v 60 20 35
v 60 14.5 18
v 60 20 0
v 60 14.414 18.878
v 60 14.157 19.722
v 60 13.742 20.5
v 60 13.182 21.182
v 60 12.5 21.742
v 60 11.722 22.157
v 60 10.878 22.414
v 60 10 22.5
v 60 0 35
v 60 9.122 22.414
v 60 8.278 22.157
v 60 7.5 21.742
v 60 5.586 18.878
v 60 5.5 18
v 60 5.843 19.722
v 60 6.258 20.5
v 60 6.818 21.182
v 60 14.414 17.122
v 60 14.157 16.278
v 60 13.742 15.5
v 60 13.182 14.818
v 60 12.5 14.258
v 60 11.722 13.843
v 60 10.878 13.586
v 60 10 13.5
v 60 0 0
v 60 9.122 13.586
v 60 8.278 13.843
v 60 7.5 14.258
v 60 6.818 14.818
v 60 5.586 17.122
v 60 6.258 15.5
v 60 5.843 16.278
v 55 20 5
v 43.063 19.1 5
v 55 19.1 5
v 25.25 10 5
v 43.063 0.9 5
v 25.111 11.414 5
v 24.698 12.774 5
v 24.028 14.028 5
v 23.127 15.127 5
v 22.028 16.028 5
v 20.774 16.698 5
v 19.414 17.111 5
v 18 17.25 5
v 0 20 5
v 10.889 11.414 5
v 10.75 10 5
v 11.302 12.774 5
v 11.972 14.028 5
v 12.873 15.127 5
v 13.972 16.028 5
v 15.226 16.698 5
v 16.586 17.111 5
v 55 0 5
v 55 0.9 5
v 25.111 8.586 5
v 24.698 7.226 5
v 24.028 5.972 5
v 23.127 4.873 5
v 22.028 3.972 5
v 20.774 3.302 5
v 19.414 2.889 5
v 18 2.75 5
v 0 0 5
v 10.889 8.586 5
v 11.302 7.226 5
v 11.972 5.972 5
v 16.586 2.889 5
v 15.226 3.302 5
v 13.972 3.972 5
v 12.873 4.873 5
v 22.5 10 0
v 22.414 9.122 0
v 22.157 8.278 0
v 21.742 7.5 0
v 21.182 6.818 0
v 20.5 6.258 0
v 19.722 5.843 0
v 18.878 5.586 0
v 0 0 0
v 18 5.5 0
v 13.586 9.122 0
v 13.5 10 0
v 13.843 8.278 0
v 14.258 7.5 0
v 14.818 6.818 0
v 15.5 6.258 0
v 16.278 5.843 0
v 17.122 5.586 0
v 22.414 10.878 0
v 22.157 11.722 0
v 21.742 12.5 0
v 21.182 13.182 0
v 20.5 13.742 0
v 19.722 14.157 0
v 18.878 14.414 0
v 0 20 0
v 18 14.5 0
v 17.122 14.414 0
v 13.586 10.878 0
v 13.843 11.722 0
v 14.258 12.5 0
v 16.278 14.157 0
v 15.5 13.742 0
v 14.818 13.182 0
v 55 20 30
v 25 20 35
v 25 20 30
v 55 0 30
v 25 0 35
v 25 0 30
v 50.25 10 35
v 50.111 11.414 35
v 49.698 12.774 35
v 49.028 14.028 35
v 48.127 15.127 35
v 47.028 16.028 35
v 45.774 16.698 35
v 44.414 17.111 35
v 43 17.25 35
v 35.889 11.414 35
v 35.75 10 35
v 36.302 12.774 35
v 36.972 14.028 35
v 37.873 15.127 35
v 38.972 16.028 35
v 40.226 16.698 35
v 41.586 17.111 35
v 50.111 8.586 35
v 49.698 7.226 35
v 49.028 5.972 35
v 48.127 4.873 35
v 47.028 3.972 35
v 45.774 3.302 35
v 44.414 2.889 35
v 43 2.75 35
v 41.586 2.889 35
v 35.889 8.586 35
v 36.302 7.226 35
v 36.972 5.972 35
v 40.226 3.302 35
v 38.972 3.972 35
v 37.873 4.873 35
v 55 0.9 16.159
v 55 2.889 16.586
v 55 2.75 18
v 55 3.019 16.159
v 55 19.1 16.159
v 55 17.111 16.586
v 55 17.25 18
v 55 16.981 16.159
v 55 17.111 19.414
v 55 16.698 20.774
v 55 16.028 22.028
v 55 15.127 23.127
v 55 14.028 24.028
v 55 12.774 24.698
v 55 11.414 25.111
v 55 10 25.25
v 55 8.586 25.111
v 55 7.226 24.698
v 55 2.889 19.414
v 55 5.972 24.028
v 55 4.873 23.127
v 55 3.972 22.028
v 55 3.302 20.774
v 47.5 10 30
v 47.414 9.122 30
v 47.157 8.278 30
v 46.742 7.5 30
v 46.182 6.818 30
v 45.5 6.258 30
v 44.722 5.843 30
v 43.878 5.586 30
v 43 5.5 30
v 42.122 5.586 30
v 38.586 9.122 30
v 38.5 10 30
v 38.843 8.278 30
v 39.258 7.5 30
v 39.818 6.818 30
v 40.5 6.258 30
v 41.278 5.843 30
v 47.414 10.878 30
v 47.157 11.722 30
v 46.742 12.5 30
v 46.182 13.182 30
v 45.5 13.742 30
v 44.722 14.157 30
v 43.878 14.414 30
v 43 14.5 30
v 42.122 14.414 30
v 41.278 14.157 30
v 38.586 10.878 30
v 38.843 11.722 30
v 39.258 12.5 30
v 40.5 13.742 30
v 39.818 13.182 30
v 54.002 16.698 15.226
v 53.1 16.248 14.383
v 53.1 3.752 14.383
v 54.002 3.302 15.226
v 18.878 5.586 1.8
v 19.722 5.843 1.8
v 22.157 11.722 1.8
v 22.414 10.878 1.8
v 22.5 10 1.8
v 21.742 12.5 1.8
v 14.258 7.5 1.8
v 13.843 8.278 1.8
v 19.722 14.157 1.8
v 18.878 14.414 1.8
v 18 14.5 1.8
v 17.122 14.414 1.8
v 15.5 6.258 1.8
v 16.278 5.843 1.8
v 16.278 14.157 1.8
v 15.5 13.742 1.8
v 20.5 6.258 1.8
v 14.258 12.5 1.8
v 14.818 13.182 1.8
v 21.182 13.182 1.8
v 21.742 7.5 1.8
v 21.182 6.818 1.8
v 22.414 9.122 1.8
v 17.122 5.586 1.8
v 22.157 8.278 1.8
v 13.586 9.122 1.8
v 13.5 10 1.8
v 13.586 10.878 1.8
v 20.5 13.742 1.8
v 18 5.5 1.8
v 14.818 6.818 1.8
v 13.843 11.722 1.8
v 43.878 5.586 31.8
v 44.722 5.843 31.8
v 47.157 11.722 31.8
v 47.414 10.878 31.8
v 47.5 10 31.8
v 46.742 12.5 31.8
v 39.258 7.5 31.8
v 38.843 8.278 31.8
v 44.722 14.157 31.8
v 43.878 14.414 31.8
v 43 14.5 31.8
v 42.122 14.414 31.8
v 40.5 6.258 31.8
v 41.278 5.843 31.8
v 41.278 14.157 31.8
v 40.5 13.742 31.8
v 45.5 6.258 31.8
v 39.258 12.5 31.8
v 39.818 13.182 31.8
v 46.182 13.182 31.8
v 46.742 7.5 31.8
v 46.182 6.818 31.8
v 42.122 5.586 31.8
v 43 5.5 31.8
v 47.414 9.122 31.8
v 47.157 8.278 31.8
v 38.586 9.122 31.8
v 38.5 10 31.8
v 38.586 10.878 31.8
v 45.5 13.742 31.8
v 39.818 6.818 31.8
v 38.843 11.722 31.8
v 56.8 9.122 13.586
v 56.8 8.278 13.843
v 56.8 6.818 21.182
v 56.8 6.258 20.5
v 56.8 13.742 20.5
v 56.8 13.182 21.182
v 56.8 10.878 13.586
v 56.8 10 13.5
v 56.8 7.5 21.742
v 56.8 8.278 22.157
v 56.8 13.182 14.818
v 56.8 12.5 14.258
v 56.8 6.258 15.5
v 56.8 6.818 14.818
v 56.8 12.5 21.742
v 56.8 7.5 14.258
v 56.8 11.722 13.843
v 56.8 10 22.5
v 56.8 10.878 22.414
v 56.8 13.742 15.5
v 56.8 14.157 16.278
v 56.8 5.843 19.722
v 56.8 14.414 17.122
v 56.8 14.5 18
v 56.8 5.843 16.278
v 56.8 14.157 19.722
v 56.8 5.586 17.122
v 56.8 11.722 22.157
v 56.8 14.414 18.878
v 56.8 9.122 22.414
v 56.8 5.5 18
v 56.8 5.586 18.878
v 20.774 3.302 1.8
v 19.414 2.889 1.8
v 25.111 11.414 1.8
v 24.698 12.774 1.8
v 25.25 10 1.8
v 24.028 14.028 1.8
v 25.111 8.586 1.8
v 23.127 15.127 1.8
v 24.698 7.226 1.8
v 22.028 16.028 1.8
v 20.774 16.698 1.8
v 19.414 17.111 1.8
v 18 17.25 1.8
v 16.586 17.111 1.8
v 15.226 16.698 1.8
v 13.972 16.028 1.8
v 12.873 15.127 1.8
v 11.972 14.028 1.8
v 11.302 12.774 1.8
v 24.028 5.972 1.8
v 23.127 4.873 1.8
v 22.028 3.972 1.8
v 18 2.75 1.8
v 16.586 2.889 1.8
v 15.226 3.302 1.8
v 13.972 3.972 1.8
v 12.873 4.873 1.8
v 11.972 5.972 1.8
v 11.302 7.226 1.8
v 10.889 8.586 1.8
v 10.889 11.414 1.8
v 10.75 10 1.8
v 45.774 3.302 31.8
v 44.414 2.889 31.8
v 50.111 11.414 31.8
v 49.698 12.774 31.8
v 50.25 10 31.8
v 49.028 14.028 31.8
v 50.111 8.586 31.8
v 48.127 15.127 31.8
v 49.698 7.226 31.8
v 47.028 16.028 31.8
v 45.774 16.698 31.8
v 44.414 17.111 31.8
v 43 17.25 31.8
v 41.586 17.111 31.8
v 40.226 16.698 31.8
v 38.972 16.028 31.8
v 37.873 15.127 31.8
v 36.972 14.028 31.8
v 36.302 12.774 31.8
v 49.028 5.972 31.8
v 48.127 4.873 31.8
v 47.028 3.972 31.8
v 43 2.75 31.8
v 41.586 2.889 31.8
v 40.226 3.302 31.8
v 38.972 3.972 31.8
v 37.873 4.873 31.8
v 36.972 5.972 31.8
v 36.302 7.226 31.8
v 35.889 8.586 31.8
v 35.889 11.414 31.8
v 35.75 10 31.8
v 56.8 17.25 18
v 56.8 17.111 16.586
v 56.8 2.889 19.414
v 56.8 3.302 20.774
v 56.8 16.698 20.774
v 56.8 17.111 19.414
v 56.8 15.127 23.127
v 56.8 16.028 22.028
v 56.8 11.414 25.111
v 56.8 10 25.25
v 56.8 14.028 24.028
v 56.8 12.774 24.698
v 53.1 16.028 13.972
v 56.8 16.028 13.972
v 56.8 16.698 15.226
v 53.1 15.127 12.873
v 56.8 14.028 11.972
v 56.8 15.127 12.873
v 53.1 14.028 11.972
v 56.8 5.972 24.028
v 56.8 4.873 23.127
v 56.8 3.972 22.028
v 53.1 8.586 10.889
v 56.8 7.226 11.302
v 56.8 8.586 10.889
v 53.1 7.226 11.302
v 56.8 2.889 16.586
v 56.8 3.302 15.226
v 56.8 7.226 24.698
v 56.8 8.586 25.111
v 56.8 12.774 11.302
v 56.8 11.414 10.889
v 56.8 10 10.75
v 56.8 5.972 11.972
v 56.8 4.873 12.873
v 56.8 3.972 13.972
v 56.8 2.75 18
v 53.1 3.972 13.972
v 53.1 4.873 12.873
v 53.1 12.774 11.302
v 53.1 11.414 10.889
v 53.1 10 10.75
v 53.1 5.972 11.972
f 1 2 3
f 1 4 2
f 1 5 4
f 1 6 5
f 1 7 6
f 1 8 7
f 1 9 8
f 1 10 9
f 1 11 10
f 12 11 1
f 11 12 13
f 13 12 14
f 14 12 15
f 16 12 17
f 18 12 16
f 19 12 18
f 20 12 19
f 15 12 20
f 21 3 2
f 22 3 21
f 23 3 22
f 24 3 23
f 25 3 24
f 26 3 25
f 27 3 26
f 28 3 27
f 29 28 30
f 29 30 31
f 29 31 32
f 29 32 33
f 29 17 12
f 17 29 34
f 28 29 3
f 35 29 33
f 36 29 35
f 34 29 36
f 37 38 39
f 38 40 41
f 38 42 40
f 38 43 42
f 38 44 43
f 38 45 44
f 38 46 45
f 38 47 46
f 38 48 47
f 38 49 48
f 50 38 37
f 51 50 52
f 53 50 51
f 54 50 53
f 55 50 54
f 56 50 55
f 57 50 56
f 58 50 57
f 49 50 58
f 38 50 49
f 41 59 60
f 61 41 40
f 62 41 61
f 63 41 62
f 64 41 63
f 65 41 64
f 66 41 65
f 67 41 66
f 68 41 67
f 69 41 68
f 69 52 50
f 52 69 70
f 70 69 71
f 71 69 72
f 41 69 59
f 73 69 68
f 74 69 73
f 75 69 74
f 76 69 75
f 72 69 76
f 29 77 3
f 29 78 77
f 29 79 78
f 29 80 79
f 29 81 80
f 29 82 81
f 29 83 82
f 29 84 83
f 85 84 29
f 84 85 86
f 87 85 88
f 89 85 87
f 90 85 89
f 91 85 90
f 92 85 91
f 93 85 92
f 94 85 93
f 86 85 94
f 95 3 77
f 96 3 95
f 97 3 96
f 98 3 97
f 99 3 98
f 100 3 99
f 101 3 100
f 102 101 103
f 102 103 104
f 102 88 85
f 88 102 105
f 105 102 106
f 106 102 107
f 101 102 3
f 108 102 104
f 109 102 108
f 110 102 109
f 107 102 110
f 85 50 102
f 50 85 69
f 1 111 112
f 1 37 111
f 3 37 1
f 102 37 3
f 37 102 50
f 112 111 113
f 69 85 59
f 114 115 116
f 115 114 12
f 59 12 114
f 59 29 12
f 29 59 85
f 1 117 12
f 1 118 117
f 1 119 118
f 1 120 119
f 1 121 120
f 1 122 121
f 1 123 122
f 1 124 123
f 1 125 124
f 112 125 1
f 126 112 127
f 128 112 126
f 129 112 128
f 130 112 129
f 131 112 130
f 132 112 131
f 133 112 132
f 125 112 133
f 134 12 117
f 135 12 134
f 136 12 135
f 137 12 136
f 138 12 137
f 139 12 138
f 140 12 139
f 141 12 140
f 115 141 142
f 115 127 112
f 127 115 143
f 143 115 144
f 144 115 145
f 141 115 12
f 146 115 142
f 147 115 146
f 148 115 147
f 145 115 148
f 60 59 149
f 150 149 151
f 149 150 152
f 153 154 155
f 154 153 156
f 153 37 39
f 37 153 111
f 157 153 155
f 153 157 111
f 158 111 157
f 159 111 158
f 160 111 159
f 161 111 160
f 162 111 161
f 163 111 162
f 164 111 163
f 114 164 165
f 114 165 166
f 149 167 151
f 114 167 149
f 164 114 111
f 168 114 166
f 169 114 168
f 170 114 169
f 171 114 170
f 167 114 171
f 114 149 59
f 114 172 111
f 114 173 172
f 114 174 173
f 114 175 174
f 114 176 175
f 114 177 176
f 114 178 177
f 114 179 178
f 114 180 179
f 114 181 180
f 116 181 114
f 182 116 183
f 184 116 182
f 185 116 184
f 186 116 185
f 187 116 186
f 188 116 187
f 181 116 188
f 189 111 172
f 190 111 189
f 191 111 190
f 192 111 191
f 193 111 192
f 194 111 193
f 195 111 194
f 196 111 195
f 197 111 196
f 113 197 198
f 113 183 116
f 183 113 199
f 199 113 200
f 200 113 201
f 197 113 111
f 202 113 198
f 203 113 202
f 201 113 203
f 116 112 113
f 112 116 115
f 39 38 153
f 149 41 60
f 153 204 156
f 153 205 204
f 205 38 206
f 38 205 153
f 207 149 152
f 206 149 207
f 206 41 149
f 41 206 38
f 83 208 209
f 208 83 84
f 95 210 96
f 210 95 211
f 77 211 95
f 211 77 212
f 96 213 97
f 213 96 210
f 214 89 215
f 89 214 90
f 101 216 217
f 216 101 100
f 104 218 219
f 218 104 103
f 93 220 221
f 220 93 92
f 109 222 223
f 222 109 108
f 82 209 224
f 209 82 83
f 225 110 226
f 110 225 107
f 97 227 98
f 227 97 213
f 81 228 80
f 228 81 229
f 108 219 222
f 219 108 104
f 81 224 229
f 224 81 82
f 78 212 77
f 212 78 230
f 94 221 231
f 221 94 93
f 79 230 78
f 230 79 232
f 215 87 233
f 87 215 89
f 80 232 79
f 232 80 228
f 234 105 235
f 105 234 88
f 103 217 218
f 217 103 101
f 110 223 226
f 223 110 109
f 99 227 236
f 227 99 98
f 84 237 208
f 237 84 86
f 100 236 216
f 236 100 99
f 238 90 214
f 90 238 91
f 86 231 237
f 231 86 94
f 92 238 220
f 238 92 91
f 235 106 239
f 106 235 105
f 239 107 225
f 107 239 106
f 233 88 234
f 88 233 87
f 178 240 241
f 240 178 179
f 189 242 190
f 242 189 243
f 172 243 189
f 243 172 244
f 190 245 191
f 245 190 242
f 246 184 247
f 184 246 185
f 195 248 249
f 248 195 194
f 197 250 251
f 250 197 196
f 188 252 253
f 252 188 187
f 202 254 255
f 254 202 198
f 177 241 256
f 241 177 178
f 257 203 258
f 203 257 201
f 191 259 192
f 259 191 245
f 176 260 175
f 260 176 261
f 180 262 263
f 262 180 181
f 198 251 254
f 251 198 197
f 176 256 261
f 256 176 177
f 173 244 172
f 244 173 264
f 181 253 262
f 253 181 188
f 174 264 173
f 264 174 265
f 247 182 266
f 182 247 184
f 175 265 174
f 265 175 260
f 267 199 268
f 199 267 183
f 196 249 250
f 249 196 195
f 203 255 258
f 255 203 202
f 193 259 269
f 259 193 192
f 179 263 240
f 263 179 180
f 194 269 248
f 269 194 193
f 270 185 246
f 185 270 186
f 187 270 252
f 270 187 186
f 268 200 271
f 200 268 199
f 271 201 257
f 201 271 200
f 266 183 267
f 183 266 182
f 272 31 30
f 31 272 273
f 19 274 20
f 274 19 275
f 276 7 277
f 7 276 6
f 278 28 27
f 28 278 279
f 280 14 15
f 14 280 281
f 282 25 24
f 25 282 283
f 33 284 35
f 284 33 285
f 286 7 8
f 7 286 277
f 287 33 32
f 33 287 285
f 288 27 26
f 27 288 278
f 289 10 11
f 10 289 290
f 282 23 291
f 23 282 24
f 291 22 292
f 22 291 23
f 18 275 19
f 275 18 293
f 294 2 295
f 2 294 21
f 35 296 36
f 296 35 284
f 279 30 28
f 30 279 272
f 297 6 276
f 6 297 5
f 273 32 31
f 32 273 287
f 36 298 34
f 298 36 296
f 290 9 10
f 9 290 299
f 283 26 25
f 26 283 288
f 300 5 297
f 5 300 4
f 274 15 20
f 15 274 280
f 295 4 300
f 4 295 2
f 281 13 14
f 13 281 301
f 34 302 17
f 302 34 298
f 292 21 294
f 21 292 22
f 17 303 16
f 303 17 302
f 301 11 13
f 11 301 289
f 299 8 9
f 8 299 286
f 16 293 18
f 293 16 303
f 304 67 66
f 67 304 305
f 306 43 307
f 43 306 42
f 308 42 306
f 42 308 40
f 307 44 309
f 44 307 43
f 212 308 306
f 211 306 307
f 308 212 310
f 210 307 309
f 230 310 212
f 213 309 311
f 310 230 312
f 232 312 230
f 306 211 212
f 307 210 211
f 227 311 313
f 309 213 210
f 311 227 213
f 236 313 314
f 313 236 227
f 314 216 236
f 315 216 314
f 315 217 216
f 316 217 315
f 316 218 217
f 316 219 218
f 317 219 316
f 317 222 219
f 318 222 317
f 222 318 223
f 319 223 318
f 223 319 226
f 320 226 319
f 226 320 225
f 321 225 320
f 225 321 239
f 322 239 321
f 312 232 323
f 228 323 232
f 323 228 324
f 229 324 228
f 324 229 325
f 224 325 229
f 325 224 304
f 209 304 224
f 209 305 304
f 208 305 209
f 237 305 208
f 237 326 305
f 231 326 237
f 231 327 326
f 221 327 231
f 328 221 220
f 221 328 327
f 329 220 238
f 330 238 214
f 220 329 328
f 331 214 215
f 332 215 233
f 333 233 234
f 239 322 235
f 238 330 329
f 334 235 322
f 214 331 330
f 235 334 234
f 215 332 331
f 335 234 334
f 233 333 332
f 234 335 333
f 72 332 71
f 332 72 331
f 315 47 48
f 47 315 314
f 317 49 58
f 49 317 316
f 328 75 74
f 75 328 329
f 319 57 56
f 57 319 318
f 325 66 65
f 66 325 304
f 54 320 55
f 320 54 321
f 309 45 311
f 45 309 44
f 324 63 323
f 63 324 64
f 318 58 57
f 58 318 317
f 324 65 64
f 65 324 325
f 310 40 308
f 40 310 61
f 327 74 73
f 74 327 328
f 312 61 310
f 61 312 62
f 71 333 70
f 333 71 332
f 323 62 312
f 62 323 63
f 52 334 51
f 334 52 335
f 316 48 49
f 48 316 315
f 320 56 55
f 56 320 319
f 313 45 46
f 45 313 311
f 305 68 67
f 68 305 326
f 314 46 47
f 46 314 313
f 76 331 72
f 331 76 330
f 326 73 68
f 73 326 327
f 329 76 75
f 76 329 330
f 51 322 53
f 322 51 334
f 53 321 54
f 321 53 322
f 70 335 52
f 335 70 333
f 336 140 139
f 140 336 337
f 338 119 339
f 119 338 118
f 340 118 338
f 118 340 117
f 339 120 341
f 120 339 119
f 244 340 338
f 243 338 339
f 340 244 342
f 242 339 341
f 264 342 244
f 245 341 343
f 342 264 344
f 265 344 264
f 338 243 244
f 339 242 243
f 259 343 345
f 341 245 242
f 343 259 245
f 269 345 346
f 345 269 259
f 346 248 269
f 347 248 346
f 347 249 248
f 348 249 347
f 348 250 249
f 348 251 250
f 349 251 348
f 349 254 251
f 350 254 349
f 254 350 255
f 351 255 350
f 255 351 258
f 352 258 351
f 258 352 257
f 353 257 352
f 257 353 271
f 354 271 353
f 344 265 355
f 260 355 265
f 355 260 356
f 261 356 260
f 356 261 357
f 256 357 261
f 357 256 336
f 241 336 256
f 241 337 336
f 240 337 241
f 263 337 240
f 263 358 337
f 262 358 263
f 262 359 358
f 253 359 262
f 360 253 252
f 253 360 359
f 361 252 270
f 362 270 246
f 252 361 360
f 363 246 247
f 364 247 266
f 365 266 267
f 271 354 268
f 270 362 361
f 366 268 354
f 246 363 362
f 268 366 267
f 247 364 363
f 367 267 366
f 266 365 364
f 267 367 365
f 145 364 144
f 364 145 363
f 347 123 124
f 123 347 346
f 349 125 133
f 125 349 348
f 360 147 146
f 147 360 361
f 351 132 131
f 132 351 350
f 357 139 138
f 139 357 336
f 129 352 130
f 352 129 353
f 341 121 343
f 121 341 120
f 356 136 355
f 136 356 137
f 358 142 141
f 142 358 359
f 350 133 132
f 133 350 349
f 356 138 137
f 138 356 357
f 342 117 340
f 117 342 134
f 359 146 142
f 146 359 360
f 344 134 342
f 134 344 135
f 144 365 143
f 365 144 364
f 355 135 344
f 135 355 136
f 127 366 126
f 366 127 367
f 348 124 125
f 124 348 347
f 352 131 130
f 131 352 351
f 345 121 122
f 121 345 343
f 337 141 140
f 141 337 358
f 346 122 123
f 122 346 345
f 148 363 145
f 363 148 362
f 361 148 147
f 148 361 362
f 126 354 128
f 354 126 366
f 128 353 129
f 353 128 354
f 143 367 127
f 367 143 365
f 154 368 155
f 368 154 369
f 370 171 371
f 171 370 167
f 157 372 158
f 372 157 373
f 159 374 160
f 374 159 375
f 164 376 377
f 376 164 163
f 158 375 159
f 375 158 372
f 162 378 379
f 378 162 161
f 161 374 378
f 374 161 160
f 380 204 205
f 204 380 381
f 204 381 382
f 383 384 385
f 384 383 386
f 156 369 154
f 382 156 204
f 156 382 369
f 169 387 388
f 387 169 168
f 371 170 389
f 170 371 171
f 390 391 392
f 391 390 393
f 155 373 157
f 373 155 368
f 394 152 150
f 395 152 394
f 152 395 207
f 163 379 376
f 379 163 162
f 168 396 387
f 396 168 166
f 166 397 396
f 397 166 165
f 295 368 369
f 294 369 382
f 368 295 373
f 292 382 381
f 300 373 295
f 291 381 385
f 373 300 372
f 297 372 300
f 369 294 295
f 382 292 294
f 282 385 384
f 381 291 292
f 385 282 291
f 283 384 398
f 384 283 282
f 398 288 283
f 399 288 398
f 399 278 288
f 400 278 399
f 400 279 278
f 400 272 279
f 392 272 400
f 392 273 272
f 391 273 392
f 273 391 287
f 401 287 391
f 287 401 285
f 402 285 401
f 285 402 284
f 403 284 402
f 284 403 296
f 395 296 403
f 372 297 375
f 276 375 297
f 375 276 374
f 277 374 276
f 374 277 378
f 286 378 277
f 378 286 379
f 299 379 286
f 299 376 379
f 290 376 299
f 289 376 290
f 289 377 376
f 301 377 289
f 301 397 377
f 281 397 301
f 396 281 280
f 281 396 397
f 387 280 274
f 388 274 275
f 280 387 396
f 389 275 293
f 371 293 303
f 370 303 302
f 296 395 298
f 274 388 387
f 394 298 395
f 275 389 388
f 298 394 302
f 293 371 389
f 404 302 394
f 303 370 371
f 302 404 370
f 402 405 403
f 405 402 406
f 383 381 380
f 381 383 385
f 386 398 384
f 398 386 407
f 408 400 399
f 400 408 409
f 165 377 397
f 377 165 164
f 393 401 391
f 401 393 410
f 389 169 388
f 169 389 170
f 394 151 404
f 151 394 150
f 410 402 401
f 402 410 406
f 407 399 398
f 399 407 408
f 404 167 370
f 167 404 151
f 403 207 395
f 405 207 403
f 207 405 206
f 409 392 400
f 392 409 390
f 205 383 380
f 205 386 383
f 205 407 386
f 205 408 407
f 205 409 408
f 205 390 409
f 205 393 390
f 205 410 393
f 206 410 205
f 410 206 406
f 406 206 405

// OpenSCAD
$fn = 32;

// ----------------------------------------------------------------------
// Z-bracket: 60 x 20 x 35 mm
// ----------------------------------------------------------------------

// --- parameters (mm) ---
bottom_run = 60;          // lower foot length, X
top_run = 30;             // upper foot length, X
profile_w = 20;           // bracket width, Y
height = 35;              // overall rise, Z
mat_t = 5;                // plate thickness
hole_d = 9;               // clearance for M8
cb_d = 14.5;              // counterbore diameter
cb_h = 3.2;               // counterbore depth
rib_len = 12.9;           // gusset leg
rib_sink = 0.9;           // gusset overlap into the plates

module hole_z(px, py, z0) {
  translate([px, py, z0 - 0.5]) cylinder(h = mat_t + 1, d = hole_d);
}
module hole_x(py, pz) {
  translate([-0.5, py, pz]) rotate([0, 90, 0]) cylinder(h = mat_t + 1, d = hole_d);
}
module cb_z(px, py, top_z) {
  translate([px, py, top_z - cb_h]) cylinder(h = cb_h + 0.5, d = cb_d);
}
module cb_x(py, pz) {
  translate([mat_t - cb_h, py, pz]) rotate([0, -90, 0]) cylinder(h = cb_h + 0.5, d = cb_d);
}
module gusset(x0) {
  translate([x0, profile_w - rib_sink, 0])
    rotate([90, 0, 0])
      linear_extrude(height = profile_w - 2 * rib_sink)
        polygon(points = [[rib_sink, mat_t - rib_sink],
                          [rib_sink, mat_t - rib_sink + rib_len],
                          [-rib_len, mat_t - rib_sink]]);
}

difference() {
  union() {
    cube([bottom_run, profile_w, mat_t]);
    /* web, overlapping the lower foot */
    translate([bottom_run - mat_t, 0, 0]) cube([mat_t, profile_w, height]);
    /* upper foot, sunk into the web */
    translate([bottom_run - mat_t - top_run, 0, height - mat_t]) cube([top_run + mat_t, profile_w, mat_t]);
    gusset(bottom_run - mat_t);
  }
  hole_z(18, 10, 0);
  translate([bottom_run - mat_t - 12, 0, 0]) hole_z(0, 10, height - mat_t);
  translate([bottom_run - mat_t, 0, 0]) hole_x(10, 18);
  cb_z(18, 10, mat_t);
  translate([bottom_run - mat_t - 12, 0, 0]) cb_z(0, 10, height);
  translate([bottom_run - mat_t, 0, 0]) cb_x(10, 18);
}
